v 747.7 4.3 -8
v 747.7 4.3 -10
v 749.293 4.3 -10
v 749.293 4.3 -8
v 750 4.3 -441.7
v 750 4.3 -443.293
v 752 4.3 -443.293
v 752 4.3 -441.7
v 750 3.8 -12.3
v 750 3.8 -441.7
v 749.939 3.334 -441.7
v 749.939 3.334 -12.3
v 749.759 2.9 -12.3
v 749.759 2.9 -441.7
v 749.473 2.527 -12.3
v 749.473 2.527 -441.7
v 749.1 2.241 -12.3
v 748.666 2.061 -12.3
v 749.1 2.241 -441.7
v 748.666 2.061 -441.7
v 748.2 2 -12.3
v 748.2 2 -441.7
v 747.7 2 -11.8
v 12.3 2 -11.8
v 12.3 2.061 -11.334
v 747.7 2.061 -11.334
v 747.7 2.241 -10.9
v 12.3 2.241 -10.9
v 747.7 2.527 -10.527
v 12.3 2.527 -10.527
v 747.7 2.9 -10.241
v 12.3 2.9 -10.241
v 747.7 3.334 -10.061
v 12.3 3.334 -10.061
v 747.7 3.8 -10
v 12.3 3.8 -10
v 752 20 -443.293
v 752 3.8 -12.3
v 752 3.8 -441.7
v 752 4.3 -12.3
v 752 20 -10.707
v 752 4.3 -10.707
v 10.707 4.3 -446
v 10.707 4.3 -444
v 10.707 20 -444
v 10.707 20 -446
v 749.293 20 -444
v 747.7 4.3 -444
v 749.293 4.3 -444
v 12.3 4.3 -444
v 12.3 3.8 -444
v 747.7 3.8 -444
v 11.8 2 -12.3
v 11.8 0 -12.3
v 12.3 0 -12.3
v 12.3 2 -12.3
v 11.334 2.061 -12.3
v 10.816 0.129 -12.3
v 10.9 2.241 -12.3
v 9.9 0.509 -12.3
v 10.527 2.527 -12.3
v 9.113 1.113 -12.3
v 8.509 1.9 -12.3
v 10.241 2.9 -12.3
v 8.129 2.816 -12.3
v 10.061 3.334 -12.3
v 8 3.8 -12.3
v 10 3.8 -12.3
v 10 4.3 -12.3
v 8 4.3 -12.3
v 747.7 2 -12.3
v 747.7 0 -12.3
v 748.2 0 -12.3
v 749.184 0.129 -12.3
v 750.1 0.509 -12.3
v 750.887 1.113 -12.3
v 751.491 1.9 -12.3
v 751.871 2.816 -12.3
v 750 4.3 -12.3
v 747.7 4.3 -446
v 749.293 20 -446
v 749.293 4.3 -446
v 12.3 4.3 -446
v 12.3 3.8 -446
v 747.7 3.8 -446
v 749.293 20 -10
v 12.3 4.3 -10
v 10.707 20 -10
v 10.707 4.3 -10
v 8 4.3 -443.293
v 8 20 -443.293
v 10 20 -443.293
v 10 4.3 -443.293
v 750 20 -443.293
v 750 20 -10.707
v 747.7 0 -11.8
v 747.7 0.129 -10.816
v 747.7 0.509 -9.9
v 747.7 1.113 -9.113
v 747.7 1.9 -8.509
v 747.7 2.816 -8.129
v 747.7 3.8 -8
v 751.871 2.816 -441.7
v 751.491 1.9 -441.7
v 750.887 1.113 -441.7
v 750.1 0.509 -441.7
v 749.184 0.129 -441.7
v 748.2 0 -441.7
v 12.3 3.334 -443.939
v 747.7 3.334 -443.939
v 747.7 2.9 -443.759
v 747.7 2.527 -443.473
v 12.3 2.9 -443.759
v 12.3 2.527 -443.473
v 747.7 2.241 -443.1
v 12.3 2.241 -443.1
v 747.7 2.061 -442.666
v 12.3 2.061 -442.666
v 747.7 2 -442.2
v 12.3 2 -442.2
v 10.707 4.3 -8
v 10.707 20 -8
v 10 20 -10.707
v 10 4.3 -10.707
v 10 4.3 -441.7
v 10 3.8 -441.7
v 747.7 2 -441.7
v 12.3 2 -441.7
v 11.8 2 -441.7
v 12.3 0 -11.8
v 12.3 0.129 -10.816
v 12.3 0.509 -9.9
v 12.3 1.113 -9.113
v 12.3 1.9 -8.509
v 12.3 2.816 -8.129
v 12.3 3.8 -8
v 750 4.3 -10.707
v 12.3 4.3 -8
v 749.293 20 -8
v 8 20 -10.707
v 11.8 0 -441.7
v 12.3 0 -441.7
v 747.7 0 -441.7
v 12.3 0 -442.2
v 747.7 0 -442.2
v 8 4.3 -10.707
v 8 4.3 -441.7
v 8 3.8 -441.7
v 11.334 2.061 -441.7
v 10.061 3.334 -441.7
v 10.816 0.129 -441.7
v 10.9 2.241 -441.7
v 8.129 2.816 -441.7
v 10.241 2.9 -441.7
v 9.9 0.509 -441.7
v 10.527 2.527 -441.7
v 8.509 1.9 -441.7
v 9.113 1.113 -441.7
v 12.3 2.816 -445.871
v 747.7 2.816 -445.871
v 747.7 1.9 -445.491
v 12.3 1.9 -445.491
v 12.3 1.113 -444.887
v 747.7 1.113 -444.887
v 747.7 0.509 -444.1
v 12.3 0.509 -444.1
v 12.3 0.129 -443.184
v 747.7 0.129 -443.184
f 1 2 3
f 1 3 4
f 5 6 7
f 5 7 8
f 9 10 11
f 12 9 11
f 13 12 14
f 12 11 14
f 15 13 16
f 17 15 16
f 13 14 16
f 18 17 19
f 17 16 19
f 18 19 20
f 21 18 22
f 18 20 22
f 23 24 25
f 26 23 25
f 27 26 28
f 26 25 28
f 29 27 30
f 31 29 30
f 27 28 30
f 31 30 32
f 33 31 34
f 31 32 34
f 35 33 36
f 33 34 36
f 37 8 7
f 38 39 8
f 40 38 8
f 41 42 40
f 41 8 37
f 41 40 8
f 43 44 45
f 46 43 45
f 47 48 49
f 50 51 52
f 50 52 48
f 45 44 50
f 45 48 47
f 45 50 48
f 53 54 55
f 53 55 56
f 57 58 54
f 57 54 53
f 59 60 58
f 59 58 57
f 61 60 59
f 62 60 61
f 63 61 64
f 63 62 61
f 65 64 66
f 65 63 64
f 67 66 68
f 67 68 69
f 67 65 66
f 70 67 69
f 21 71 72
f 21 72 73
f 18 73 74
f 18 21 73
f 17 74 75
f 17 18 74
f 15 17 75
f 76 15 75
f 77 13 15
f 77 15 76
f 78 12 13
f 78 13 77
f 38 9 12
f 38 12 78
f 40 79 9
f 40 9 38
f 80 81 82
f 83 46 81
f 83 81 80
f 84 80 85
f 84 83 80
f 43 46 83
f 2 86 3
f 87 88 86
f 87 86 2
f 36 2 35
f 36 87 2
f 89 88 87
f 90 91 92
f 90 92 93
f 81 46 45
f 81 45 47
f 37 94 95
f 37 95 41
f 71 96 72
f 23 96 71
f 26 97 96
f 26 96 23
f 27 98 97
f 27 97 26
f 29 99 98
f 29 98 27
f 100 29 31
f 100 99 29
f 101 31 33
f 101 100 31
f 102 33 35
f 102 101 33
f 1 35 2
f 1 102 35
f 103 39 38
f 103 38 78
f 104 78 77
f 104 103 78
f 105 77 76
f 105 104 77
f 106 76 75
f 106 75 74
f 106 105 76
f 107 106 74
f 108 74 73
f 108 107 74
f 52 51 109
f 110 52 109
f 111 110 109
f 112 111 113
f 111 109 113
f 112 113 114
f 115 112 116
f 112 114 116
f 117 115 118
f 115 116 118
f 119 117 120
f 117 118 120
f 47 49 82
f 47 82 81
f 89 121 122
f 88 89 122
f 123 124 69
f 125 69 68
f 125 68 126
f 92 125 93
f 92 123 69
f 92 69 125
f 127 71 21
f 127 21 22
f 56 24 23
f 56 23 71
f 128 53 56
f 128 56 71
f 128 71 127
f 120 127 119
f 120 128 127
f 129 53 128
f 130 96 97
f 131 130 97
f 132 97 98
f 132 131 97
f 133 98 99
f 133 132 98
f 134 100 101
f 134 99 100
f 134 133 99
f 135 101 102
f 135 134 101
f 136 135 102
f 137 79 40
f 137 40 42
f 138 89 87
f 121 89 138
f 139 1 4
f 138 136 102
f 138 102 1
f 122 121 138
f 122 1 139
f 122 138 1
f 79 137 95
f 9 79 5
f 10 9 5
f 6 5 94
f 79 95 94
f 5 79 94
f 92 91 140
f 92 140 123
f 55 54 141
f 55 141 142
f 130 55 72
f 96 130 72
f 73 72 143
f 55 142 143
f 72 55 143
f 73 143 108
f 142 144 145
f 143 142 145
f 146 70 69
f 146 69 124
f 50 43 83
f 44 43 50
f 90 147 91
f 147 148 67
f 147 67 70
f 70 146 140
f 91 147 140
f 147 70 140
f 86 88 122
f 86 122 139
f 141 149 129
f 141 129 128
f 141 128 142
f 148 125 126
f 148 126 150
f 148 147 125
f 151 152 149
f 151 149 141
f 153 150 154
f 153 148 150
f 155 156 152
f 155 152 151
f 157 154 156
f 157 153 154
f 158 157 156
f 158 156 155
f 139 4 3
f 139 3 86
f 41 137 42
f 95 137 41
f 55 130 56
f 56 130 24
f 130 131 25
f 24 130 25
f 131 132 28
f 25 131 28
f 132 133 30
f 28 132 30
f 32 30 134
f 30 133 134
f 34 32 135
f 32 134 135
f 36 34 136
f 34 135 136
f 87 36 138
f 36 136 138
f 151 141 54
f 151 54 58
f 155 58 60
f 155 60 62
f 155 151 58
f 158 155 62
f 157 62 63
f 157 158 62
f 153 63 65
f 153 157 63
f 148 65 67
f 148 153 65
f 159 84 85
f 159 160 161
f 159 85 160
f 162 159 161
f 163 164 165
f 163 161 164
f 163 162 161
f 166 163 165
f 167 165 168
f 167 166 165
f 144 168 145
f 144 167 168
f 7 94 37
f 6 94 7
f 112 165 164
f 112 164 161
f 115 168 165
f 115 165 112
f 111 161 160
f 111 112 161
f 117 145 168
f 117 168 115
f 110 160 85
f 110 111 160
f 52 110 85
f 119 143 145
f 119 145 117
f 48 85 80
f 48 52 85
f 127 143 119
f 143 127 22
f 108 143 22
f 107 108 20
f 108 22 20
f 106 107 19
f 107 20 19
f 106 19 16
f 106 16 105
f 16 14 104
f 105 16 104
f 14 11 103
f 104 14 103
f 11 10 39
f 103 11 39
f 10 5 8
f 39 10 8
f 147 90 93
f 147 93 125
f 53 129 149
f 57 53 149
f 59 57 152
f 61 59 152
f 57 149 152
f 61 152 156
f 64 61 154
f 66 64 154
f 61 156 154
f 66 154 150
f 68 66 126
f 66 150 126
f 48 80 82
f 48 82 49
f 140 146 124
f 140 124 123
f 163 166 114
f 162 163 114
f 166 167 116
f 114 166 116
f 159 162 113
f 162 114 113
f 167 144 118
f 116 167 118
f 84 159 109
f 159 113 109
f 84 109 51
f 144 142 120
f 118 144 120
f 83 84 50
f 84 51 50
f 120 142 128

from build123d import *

# Parameters (mm, degrees)
SKETCH1_W                  = 760
SKETCH1_H                  = 454
BOSS_EXTRUDE1_DEPTH        = 20
SKETCH2_W                  = 740
SKETCH2_H                  = 434
CUT_EXTRUDE1_DEPTH         = 18
CONVERT_SOLID2_OUTLINE_W   = 15.7
CONVERT_SOLID2_OUTLINE_H   = 2
CONVERT_SOLID2_DEPTH       = 10.707106781
CONVERT_SOLID2_START       = 749.292893219
CONVERT_SOLID2_2_OUTLINE_W = 15.7
CONVERT_SOLID2_2_OUTLINE_H = 2
CONVERT_SOLID2_2_DEPTH     = 10.707106781
CONVERT_SOLID2_3_DEPTH     = 760
CONVERT_SOLID2_4_DEPTH     = 8
CONVERT_SOLID2_START_2     = 752
CONVERT_SOLID2_5_DEPTH     = 8
CONVERT_SOLID2_START_3     = 8
CONVERT_SOLID2_6_DEPTH     = 4.3
CONVERT_SOLID2_START_4     = 747.7
CONVERT_SOLID2_7_DEPTH     = 4.3
CONVERT_SOLID2_START_5     = 12.3
CONVERT_SOLID2_8_DEPTH     = 735.4
CONVERT_SOLID2_START_6     = -441.7
CONVERT_SOLID2_9_DEPTH     = 429.4
CONVERT_SOLID2_10_DEPTH    = 429.4


with BuildPart() as part:
    # Sketch1 → Boss-Extrude1 (new body)
    with BuildSketch(Plane(origin=(0, 0, 0), x_dir=(1, 0, 0), z_dir=(0, 1, 0))):
        with Locations((380, 227)):
            Rectangle(SKETCH1_W, SKETCH1_H)
    extrude(amount=BOSS_EXTRUDE1_DEPTH)

    # Sketch2 → Cut-Extrude1 (cut)
    with BuildSketch(Plane(origin=(0, 20, 0), x_dir=(1, 0, 0), z_dir=(0, 1, 0))):
        with Locations((380, 227)):
            Rectangle(SKETCH2_W, SKETCH2_H)
    extrude(amount=-CUT_EXTRUDE1_DEPTH, mode=Mode.SUBTRACT)

    # Convert-Solid2: read off the stored shape, not the designer's step
    # Convert-Solid2 outline → Convert-Solid2 (cut)
    with BuildSketch(Plane.YZ):
        with Locations((12.15, -9)):
            Rectangle(CONVERT_SOLID2_OUTLINE_W, CONVERT_SOLID2_OUTLINE_H)
        with Locations((12.15, -445)):
            Rectangle(CONVERT_SOLID2_OUTLINE_W, CONVERT_SOLID2_OUTLINE_H)
    extrude(amount=CONVERT_SOLID2_DEPTH, mode=Mode.SUBTRACT)

    # Convert-Solid2 2 outline → Convert-Solid2 2 (cut)
    with BuildSketch(Plane.YZ.offset(CONVERT_SOLID2_START)):
        with Locations((12.15, -9)):
            Rectangle(CONVERT_SOLID2_2_OUTLINE_W, CONVERT_SOLID2_2_OUTLINE_H)
        with Locations((12.15, -445)):
            Rectangle(CONVERT_SOLID2_2_OUTLINE_W, CONVERT_SOLID2_2_OUTLINE_H)
    extrude(amount=CONVERT_SOLID2_2_DEPTH, mode=Mode.SUBTRACT)

    # Convert-Solid2 3 outline → Convert-Solid2 3 (cut)
    with BuildSketch(Plane.YZ):
        with BuildLine():
            Line((4.3, -441.7), (2, -441.7))
            Line((2, -441.7), (2, -442.2))
            ThreePointArc((2, -442.2), (2.527207794, -443.472792206), (3.8, -444))
            Line((3.8, -444), (20, -444))
            Line((20, -444), (20, -443.292893219))
            Line((20, -443.292893219), (4.3, -443.292893219))
            Line((4.3, -443.292893219), (4.3, -441.7))
        make_face()
        with BuildLine():
            Line((2, -11.8), (2, -12.3))
            Line((2, -12.3), (4.3, -12.3))
            Line((4.3, -12.3), (4.3, -10.707106781))
            Line((4.3, -10.707106781), (20, -10.707106781))
            Line((20, -10.707106781), (20, -10))
            Line((20, -10), (3.8, -10))
            ThreePointArc((3.8, -10), (2.527207794, -10.527207794), (2, -11.8))
        make_face()
        with BuildLine():
            ThreePointArc((3.8, -446), (1.112994231, -444.887005769), (0, -442.2))
            Line((0, -442.2), (0, -454))
            Line((0, -454), (20, -454))
            Line((20, -454), (20, -446))
            Line((20, -446), (3.8, -446))
        make_face()
        with BuildLine():
            Line((0, 0), (0, -11.8))
            ThreePointArc((0, -11.8), (1.112994231, -9.112994231), (3.8, -8))
            Line((3.8, -8), (20, -8))
            Line((20, -8), (20, 0))
            Line((20, 0), (0, 0))
        make_face()
    extrude(amount=CONVERT_SOLID2_3_DEPTH, mode=Mode.SUBTRACT)

    # Convert-Solid2 4 outline → Convert-Solid2 4 (cut)
    with BuildSketch(Plane.YZ):
        with BuildLine():
            Line((2, -442.2), (2, -441.7))
            Line((2, -441.7), (4.3, -441.7))
            Line((4.3, -441.7), (4.3, -443.292893219))
            Line((4.3, -443.292893219), (20, -443.292893219))
            Line((20, -443.292893219), (20, -10.707106781))
            Line((20, -10.707106781), (4.3, -10.707106781))
            Line((4.3, -10.707106781), (4.3, -12.3))
            Line((4.3, -12.3), (2, -12.3))
            Line((2, -12.3), (2, -11.8))
            ThreePointArc((2, -11.8), (2.527207794, -10.527207794), (3.8, -10))
            Line((3.8, -10), (4.3, -10))
            Line((4.3, -10), (4.3, -8))
            Line((4.3, -8), (3.8, -8))
            ThreePointArc((3.8, -8), (1.112994231, -9.112994231), (0, -11.8))
            Line((0, -11.8), (0, -442.2))
            ThreePointArc((0, -442.2), (1.112994231, -444.887005769), (3.8, -446))
            Line((3.8, -446), (4.3, -446))
            Line((4.3, -446), (4.3, -444))
            Line((4.3, -444), (3.8, -444))
            ThreePointArc((3.8, -444), (2.527207794, -443.472792206), (2, -442.2))
        make_face()
    extrude(amount=CONVERT_SOLID2_4_DEPTH, mode=Mode.SUBTRACT)

    # Convert-Solid2 5 outline → Convert-Solid2 5 (cut)
    with BuildSketch(Plane.YZ.offset(CONVERT_SOLID2_START_2)):
        with BuildLine():
            Line((2, -442.2), (2, -441.7))
            Line((2, -441.7), (4.3, -441.7))
            Line((4.3, -441.7), (4.3, -443.292893219))
            Line((4.3, -443.292893219), (20, -443.292893219))
            Line((20, -443.292893219), (20, -10.707106781))
            Line((20, -10.707106781), (4.3, -10.707106781))
            Line((4.3, -10.707106781), (4.3, -12.3))
            Line((4.3, -12.3), (2, -12.3))
            Line((2, -12.3), (2, -11.8))
            ThreePointArc((2, -11.8), (2.527207794, -10.527207794), (3.8, -10))
            Line((3.8, -10), (4.3, -10))
            Line((4.3, -10), (4.3, -8))
            Line((4.3, -8), (3.8, -8))
            ThreePointArc((3.8, -8), (1.112994231, -9.112994231), (0, -11.8))
            Line((0, -11.8), (0, -442.2))
            ThreePointArc((0, -442.2), (1.112994231, -444.887005769), (3.8, -446))
            Line((3.8, -446), (4.3, -446))
            Line((4.3, -446), (4.3, -444))
            Line((4.3, -444), (3.8, -444))
            ThreePointArc((3.8, -444), (2.527207794, -443.472792206), (2, -442.2))
        make_face()
    extrude(amount=CONVERT_SOLID2_5_DEPTH, mode=Mode.SUBTRACT)

    # Convert-Solid2 6 outline → Convert-Solid2 6 (cut)
    with BuildSketch(Plane.YZ.offset(CONVERT_SOLID2_START_3)):
        with BuildLine():
            Line((2, -442.2), (2, -441.7))
            Line((2, -441.7), (0, -441.7))
            Line((0, -441.7), (0, -442.2))
            ThreePointArc((0, -442.2), (1.112994231, -444.887005769), (3.8, -446))
            Line((3.8, -446), (4.3, -446))
            Line((4.3, -446), (4.3, -444))
            Line((4.3, -444), (3.8, -444))
            ThreePointArc((3.8, -444), (2.527207794, -443.472792206), (2, -442.2))
        make_face()
        with BuildLine():
            Line((0, -12.3), (2, -12.3))
            Line((2, -12.3), (2, -11.8))
            ThreePointArc((2, -11.8), (2.527207794, -10.527207794), (3.8, -10))
            Line((3.8, -10), (4.3, -10))
            Line((4.3, -10), (4.3, -8))
            Line((4.3, -8), (3.8, -8))
            ThreePointArc((3.8, -8), (1.112994231, -9.112994231), (0, -11.8))
            Line((0, -11.8), (0, -12.3))
        make_face()
    extrude(amount=CONVERT_SOLID2_6_DEPTH, mode=Mode.SUBTRACT)

    # Convert-Solid2 7 outline → Convert-Solid2 7 (cut)
    with BuildSketch(Plane.YZ.offset(CONVERT_SOLID2_START_4)):
        with BuildLine():
            Line((2, -442.2), (2, -441.7))
            Line((2, -441.7), (0, -441.7))
            Line((0, -441.7), (0, -442.2))
            ThreePointArc((0, -442.2), (1.112994231, -444.887005769), (3.8, -446))
            Line((3.8, -446), (4.3, -446))
            Line((4.3, -446), (4.3, -444))
            Line((4.3, -444), (3.8, -444))
            ThreePointArc((3.8, -444), (2.527207794, -443.472792206), (2, -442.2))
        make_face()
        with BuildLine():
            Line((0, -12.3), (2, -12.3))
            Line((2, -12.3), (2, -11.8))
            ThreePointArc((2, -11.8), (2.527207794, -10.527207794), (3.8, -10))
            Line((3.8, -10), (4.3, -10))
            Line((4.3, -10), (4.3, -8))
            Line((4.3, -8), (3.8, -8))
            ThreePointArc((3.8, -8), (1.112994231, -9.112994231), (0, -11.8))
            Line((0, -11.8), (0, -12.3))
        make_face()
    extrude(amount=CONVERT_SOLID2_7_DEPTH, mode=Mode.SUBTRACT)

    # Convert-Solid2 8 outline → Convert-Solid2 8 (add)
    with BuildSketch(Plane.YZ.offset(CONVERT_SOLID2_START_5)):
        with BuildLine():
            ThreePointArc((3.8, -444), (2.527207794, -443.472792206), (2, -442.2))
            Line((2, -442.2), (2, -444))
            Line((2, -444), (3.8, -444))
        make_face()
        with BuildLine():
            Line((2, -10), (2, -11.8))
            ThreePointArc((2, -11.8), (2.527207794, -10.527207794), (3.8, -10))
            Line((3.8, -10), (2, -10))
        make_face()
    extrude(amount=CONVERT_SOLID2_8_DEPTH)

    # Convert-Solid2 9 outline → Convert-Solid2 9 (cut)
    with BuildSketch(Plane.XY.offset(CONVERT_SOLID2_START_6)):
        with BuildLine():
            Line((752, 0), (752, 3.8))
            ThreePointArc((752, 3.8), (750.887005769, 1.112994231), (748.2, 0))
            Line((748.2, 0), (752, 0))
        make_face()
        with BuildLine():
            Line((8, 0), (11.8, 0))
            ThreePointArc((11.8, 0), (9.112994231, 1.112994231), (8, 3.8))
            Line((8, 3.8), (8, 0))
        make_face()
    extrude(amount=CONVERT_SOLID2_9_DEPTH, mode=Mode.SUBTRACT)

    # Convert-Solid2 10 outline → Convert-Solid2 10 (add)
    with BuildSketch(Plane.XY.offset(CONVERT_SOLID2_START_6)):
        with BuildLine():
            Line((750, 2), (750, 3.8))
            ThreePointArc((750, 3.8), (749.472792206, 2.527207794), (748.2, 2))
            Line((748.2, 2), (750, 2))
        make_face()
        with BuildLine():
            Line((10, 2), (11.8, 2))
            ThreePointArc((11.8, 2), (10.527207794, 2.527207794), (10, 3.8))
            Line((10, 3.8), (10, 2))
        make_face()
    extrude(amount=CONVERT_SOLID2_10_DEPTH)


solid = part.part
